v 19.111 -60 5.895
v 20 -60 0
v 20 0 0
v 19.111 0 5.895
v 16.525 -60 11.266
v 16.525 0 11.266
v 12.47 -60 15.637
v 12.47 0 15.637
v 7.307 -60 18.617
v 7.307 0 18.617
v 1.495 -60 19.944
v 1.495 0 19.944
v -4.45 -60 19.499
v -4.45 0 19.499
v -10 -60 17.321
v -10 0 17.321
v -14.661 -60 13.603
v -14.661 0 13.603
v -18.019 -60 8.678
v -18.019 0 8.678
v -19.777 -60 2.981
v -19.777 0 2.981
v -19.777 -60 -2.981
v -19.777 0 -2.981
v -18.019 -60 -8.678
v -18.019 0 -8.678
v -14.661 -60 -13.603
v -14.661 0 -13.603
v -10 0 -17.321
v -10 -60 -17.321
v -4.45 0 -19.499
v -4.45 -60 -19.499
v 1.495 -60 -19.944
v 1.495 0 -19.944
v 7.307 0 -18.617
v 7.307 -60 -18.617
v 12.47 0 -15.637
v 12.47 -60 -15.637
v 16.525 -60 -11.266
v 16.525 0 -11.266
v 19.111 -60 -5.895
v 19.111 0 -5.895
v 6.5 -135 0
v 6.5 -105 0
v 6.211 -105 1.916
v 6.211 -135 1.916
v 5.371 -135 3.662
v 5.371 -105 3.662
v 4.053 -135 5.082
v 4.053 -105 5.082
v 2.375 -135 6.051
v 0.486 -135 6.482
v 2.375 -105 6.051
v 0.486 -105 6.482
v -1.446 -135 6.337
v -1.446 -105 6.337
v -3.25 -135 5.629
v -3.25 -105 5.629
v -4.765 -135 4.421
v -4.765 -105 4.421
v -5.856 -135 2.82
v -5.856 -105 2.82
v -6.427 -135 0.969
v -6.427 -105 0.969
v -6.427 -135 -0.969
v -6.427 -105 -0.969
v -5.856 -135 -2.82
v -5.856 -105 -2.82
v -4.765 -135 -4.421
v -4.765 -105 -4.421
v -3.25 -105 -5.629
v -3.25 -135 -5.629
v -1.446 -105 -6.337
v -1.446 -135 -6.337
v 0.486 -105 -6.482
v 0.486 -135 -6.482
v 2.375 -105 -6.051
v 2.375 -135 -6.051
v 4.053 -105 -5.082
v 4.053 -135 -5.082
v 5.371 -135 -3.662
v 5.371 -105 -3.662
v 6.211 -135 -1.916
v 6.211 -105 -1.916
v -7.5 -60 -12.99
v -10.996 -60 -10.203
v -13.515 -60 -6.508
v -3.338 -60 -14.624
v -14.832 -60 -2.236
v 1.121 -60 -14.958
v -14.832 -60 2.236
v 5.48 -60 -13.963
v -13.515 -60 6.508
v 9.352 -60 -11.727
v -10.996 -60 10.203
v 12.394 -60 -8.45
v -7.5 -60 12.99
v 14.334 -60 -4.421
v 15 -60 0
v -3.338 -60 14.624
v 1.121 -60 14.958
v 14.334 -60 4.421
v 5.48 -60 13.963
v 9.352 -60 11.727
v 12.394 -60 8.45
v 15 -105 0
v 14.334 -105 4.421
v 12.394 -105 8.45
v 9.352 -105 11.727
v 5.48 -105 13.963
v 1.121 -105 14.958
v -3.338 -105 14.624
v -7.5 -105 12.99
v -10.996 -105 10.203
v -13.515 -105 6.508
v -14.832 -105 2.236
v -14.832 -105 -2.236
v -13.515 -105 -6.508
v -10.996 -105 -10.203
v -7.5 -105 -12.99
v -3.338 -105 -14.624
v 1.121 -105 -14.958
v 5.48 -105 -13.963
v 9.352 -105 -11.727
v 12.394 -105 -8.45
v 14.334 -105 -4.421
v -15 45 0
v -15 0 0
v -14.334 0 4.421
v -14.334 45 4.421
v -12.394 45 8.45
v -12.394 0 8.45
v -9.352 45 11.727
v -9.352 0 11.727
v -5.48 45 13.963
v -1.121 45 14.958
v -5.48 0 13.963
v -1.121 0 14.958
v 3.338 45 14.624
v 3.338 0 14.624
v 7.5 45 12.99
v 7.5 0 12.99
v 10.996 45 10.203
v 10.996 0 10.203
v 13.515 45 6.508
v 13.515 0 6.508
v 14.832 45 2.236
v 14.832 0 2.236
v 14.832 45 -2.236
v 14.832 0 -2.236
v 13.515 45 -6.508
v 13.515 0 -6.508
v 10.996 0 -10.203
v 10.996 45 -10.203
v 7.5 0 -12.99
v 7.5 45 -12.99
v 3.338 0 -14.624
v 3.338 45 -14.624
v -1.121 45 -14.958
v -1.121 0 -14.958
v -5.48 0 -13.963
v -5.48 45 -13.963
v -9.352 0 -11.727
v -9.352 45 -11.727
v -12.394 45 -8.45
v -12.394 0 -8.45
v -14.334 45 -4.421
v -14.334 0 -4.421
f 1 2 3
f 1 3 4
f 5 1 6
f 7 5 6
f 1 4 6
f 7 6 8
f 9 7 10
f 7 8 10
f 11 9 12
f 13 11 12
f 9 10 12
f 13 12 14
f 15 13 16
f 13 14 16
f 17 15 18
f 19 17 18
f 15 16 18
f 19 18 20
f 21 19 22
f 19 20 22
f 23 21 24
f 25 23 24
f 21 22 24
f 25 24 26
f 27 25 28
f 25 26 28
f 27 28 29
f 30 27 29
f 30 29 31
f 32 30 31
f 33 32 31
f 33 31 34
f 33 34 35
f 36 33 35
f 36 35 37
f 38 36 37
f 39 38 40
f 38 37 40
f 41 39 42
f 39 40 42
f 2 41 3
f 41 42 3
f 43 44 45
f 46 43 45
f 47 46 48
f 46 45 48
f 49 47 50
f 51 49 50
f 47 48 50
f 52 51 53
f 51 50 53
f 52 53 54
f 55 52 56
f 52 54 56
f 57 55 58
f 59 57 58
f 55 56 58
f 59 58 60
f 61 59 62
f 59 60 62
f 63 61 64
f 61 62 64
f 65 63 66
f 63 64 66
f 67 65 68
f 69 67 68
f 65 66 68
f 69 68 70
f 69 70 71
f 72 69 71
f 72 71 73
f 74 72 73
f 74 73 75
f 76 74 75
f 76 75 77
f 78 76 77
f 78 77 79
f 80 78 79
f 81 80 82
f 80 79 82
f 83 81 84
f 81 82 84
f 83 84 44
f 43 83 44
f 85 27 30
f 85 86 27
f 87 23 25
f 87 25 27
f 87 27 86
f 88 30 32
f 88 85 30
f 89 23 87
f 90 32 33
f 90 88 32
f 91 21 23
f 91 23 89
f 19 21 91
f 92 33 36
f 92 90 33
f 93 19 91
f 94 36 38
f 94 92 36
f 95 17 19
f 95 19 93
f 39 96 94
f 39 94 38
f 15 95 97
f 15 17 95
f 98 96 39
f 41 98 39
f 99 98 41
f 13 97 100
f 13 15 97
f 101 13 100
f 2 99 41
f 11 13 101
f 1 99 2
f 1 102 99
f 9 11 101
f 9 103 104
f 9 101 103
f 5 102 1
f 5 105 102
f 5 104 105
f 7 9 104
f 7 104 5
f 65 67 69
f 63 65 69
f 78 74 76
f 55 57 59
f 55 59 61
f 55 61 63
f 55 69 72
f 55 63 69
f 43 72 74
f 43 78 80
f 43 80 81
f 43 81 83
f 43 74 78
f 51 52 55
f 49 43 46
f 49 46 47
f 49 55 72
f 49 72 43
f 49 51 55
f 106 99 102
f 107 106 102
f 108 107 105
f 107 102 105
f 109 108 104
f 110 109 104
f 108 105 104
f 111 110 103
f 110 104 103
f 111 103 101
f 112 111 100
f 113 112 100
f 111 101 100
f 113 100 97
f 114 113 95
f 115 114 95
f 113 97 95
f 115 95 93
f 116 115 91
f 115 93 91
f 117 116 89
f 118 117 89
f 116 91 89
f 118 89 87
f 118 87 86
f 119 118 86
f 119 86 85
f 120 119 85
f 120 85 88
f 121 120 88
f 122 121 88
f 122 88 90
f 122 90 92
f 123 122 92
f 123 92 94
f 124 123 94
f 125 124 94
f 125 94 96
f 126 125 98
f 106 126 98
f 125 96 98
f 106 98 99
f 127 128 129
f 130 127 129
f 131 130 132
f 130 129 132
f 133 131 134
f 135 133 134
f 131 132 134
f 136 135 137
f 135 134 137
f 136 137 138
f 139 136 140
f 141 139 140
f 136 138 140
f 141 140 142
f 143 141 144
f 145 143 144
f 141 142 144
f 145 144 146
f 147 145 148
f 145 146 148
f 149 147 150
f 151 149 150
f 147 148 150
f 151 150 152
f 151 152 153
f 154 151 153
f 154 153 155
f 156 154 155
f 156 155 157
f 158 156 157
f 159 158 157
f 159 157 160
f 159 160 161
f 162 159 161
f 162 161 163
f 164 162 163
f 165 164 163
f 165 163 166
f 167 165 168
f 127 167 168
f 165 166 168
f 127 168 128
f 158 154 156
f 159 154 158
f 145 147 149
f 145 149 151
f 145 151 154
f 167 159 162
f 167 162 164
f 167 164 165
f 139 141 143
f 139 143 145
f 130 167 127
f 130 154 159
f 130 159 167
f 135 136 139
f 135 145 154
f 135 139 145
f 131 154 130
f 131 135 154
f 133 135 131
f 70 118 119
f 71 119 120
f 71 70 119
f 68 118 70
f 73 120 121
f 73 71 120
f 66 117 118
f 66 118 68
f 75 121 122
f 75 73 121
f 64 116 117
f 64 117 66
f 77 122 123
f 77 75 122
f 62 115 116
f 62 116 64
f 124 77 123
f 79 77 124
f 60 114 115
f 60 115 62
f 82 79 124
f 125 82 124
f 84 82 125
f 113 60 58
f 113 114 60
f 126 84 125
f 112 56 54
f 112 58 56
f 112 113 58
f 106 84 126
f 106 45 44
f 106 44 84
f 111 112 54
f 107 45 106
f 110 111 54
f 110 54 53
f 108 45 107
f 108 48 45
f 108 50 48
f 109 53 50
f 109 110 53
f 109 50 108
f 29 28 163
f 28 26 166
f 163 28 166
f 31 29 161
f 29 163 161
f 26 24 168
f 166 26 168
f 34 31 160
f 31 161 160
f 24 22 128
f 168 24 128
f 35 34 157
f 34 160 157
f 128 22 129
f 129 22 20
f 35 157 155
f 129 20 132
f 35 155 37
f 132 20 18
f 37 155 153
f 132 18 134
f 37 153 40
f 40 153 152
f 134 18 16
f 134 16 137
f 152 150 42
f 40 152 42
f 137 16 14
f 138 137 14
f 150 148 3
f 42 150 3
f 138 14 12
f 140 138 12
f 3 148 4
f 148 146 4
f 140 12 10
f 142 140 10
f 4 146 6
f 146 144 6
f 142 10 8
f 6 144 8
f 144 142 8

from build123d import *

# Parameters (mm, degrees)
F0_R     = 20
F1_DEPTH = 60
F3_R     = 15
F4_DEPTH = 45
F2_R     = 15
F5_DEPTH = 45
F6_R     = 6.5
F7_DEPTH = 30


with BuildPart() as f1:
    # F0 (on Front) → F1 (new body)
    with BuildSketch(Plane.XZ):
        Circle(F0_R)
    extrude(amount=F1_DEPTH)

    # F3 (on face) → F4 (join)
    with BuildSketch(Plane(origin=(0, 0, 0), x_dir=(-1, 0, 0), z_dir=(0, 1, 0))):
        Circle(F3_R)
    extrude(amount=F4_DEPTH)

    # F2 (on face) → F5 (join)
    with BuildSketch(Plane.XZ.offset(60)):
        Circle(F2_R)
    extrude(amount=F5_DEPTH)

    # F6 (on face) → F7 (join)
    with BuildSketch(Plane.XZ.offset(105)):
        Circle(F6_R)
    extrude(amount=F7_DEPTH)


solid = f1.part
